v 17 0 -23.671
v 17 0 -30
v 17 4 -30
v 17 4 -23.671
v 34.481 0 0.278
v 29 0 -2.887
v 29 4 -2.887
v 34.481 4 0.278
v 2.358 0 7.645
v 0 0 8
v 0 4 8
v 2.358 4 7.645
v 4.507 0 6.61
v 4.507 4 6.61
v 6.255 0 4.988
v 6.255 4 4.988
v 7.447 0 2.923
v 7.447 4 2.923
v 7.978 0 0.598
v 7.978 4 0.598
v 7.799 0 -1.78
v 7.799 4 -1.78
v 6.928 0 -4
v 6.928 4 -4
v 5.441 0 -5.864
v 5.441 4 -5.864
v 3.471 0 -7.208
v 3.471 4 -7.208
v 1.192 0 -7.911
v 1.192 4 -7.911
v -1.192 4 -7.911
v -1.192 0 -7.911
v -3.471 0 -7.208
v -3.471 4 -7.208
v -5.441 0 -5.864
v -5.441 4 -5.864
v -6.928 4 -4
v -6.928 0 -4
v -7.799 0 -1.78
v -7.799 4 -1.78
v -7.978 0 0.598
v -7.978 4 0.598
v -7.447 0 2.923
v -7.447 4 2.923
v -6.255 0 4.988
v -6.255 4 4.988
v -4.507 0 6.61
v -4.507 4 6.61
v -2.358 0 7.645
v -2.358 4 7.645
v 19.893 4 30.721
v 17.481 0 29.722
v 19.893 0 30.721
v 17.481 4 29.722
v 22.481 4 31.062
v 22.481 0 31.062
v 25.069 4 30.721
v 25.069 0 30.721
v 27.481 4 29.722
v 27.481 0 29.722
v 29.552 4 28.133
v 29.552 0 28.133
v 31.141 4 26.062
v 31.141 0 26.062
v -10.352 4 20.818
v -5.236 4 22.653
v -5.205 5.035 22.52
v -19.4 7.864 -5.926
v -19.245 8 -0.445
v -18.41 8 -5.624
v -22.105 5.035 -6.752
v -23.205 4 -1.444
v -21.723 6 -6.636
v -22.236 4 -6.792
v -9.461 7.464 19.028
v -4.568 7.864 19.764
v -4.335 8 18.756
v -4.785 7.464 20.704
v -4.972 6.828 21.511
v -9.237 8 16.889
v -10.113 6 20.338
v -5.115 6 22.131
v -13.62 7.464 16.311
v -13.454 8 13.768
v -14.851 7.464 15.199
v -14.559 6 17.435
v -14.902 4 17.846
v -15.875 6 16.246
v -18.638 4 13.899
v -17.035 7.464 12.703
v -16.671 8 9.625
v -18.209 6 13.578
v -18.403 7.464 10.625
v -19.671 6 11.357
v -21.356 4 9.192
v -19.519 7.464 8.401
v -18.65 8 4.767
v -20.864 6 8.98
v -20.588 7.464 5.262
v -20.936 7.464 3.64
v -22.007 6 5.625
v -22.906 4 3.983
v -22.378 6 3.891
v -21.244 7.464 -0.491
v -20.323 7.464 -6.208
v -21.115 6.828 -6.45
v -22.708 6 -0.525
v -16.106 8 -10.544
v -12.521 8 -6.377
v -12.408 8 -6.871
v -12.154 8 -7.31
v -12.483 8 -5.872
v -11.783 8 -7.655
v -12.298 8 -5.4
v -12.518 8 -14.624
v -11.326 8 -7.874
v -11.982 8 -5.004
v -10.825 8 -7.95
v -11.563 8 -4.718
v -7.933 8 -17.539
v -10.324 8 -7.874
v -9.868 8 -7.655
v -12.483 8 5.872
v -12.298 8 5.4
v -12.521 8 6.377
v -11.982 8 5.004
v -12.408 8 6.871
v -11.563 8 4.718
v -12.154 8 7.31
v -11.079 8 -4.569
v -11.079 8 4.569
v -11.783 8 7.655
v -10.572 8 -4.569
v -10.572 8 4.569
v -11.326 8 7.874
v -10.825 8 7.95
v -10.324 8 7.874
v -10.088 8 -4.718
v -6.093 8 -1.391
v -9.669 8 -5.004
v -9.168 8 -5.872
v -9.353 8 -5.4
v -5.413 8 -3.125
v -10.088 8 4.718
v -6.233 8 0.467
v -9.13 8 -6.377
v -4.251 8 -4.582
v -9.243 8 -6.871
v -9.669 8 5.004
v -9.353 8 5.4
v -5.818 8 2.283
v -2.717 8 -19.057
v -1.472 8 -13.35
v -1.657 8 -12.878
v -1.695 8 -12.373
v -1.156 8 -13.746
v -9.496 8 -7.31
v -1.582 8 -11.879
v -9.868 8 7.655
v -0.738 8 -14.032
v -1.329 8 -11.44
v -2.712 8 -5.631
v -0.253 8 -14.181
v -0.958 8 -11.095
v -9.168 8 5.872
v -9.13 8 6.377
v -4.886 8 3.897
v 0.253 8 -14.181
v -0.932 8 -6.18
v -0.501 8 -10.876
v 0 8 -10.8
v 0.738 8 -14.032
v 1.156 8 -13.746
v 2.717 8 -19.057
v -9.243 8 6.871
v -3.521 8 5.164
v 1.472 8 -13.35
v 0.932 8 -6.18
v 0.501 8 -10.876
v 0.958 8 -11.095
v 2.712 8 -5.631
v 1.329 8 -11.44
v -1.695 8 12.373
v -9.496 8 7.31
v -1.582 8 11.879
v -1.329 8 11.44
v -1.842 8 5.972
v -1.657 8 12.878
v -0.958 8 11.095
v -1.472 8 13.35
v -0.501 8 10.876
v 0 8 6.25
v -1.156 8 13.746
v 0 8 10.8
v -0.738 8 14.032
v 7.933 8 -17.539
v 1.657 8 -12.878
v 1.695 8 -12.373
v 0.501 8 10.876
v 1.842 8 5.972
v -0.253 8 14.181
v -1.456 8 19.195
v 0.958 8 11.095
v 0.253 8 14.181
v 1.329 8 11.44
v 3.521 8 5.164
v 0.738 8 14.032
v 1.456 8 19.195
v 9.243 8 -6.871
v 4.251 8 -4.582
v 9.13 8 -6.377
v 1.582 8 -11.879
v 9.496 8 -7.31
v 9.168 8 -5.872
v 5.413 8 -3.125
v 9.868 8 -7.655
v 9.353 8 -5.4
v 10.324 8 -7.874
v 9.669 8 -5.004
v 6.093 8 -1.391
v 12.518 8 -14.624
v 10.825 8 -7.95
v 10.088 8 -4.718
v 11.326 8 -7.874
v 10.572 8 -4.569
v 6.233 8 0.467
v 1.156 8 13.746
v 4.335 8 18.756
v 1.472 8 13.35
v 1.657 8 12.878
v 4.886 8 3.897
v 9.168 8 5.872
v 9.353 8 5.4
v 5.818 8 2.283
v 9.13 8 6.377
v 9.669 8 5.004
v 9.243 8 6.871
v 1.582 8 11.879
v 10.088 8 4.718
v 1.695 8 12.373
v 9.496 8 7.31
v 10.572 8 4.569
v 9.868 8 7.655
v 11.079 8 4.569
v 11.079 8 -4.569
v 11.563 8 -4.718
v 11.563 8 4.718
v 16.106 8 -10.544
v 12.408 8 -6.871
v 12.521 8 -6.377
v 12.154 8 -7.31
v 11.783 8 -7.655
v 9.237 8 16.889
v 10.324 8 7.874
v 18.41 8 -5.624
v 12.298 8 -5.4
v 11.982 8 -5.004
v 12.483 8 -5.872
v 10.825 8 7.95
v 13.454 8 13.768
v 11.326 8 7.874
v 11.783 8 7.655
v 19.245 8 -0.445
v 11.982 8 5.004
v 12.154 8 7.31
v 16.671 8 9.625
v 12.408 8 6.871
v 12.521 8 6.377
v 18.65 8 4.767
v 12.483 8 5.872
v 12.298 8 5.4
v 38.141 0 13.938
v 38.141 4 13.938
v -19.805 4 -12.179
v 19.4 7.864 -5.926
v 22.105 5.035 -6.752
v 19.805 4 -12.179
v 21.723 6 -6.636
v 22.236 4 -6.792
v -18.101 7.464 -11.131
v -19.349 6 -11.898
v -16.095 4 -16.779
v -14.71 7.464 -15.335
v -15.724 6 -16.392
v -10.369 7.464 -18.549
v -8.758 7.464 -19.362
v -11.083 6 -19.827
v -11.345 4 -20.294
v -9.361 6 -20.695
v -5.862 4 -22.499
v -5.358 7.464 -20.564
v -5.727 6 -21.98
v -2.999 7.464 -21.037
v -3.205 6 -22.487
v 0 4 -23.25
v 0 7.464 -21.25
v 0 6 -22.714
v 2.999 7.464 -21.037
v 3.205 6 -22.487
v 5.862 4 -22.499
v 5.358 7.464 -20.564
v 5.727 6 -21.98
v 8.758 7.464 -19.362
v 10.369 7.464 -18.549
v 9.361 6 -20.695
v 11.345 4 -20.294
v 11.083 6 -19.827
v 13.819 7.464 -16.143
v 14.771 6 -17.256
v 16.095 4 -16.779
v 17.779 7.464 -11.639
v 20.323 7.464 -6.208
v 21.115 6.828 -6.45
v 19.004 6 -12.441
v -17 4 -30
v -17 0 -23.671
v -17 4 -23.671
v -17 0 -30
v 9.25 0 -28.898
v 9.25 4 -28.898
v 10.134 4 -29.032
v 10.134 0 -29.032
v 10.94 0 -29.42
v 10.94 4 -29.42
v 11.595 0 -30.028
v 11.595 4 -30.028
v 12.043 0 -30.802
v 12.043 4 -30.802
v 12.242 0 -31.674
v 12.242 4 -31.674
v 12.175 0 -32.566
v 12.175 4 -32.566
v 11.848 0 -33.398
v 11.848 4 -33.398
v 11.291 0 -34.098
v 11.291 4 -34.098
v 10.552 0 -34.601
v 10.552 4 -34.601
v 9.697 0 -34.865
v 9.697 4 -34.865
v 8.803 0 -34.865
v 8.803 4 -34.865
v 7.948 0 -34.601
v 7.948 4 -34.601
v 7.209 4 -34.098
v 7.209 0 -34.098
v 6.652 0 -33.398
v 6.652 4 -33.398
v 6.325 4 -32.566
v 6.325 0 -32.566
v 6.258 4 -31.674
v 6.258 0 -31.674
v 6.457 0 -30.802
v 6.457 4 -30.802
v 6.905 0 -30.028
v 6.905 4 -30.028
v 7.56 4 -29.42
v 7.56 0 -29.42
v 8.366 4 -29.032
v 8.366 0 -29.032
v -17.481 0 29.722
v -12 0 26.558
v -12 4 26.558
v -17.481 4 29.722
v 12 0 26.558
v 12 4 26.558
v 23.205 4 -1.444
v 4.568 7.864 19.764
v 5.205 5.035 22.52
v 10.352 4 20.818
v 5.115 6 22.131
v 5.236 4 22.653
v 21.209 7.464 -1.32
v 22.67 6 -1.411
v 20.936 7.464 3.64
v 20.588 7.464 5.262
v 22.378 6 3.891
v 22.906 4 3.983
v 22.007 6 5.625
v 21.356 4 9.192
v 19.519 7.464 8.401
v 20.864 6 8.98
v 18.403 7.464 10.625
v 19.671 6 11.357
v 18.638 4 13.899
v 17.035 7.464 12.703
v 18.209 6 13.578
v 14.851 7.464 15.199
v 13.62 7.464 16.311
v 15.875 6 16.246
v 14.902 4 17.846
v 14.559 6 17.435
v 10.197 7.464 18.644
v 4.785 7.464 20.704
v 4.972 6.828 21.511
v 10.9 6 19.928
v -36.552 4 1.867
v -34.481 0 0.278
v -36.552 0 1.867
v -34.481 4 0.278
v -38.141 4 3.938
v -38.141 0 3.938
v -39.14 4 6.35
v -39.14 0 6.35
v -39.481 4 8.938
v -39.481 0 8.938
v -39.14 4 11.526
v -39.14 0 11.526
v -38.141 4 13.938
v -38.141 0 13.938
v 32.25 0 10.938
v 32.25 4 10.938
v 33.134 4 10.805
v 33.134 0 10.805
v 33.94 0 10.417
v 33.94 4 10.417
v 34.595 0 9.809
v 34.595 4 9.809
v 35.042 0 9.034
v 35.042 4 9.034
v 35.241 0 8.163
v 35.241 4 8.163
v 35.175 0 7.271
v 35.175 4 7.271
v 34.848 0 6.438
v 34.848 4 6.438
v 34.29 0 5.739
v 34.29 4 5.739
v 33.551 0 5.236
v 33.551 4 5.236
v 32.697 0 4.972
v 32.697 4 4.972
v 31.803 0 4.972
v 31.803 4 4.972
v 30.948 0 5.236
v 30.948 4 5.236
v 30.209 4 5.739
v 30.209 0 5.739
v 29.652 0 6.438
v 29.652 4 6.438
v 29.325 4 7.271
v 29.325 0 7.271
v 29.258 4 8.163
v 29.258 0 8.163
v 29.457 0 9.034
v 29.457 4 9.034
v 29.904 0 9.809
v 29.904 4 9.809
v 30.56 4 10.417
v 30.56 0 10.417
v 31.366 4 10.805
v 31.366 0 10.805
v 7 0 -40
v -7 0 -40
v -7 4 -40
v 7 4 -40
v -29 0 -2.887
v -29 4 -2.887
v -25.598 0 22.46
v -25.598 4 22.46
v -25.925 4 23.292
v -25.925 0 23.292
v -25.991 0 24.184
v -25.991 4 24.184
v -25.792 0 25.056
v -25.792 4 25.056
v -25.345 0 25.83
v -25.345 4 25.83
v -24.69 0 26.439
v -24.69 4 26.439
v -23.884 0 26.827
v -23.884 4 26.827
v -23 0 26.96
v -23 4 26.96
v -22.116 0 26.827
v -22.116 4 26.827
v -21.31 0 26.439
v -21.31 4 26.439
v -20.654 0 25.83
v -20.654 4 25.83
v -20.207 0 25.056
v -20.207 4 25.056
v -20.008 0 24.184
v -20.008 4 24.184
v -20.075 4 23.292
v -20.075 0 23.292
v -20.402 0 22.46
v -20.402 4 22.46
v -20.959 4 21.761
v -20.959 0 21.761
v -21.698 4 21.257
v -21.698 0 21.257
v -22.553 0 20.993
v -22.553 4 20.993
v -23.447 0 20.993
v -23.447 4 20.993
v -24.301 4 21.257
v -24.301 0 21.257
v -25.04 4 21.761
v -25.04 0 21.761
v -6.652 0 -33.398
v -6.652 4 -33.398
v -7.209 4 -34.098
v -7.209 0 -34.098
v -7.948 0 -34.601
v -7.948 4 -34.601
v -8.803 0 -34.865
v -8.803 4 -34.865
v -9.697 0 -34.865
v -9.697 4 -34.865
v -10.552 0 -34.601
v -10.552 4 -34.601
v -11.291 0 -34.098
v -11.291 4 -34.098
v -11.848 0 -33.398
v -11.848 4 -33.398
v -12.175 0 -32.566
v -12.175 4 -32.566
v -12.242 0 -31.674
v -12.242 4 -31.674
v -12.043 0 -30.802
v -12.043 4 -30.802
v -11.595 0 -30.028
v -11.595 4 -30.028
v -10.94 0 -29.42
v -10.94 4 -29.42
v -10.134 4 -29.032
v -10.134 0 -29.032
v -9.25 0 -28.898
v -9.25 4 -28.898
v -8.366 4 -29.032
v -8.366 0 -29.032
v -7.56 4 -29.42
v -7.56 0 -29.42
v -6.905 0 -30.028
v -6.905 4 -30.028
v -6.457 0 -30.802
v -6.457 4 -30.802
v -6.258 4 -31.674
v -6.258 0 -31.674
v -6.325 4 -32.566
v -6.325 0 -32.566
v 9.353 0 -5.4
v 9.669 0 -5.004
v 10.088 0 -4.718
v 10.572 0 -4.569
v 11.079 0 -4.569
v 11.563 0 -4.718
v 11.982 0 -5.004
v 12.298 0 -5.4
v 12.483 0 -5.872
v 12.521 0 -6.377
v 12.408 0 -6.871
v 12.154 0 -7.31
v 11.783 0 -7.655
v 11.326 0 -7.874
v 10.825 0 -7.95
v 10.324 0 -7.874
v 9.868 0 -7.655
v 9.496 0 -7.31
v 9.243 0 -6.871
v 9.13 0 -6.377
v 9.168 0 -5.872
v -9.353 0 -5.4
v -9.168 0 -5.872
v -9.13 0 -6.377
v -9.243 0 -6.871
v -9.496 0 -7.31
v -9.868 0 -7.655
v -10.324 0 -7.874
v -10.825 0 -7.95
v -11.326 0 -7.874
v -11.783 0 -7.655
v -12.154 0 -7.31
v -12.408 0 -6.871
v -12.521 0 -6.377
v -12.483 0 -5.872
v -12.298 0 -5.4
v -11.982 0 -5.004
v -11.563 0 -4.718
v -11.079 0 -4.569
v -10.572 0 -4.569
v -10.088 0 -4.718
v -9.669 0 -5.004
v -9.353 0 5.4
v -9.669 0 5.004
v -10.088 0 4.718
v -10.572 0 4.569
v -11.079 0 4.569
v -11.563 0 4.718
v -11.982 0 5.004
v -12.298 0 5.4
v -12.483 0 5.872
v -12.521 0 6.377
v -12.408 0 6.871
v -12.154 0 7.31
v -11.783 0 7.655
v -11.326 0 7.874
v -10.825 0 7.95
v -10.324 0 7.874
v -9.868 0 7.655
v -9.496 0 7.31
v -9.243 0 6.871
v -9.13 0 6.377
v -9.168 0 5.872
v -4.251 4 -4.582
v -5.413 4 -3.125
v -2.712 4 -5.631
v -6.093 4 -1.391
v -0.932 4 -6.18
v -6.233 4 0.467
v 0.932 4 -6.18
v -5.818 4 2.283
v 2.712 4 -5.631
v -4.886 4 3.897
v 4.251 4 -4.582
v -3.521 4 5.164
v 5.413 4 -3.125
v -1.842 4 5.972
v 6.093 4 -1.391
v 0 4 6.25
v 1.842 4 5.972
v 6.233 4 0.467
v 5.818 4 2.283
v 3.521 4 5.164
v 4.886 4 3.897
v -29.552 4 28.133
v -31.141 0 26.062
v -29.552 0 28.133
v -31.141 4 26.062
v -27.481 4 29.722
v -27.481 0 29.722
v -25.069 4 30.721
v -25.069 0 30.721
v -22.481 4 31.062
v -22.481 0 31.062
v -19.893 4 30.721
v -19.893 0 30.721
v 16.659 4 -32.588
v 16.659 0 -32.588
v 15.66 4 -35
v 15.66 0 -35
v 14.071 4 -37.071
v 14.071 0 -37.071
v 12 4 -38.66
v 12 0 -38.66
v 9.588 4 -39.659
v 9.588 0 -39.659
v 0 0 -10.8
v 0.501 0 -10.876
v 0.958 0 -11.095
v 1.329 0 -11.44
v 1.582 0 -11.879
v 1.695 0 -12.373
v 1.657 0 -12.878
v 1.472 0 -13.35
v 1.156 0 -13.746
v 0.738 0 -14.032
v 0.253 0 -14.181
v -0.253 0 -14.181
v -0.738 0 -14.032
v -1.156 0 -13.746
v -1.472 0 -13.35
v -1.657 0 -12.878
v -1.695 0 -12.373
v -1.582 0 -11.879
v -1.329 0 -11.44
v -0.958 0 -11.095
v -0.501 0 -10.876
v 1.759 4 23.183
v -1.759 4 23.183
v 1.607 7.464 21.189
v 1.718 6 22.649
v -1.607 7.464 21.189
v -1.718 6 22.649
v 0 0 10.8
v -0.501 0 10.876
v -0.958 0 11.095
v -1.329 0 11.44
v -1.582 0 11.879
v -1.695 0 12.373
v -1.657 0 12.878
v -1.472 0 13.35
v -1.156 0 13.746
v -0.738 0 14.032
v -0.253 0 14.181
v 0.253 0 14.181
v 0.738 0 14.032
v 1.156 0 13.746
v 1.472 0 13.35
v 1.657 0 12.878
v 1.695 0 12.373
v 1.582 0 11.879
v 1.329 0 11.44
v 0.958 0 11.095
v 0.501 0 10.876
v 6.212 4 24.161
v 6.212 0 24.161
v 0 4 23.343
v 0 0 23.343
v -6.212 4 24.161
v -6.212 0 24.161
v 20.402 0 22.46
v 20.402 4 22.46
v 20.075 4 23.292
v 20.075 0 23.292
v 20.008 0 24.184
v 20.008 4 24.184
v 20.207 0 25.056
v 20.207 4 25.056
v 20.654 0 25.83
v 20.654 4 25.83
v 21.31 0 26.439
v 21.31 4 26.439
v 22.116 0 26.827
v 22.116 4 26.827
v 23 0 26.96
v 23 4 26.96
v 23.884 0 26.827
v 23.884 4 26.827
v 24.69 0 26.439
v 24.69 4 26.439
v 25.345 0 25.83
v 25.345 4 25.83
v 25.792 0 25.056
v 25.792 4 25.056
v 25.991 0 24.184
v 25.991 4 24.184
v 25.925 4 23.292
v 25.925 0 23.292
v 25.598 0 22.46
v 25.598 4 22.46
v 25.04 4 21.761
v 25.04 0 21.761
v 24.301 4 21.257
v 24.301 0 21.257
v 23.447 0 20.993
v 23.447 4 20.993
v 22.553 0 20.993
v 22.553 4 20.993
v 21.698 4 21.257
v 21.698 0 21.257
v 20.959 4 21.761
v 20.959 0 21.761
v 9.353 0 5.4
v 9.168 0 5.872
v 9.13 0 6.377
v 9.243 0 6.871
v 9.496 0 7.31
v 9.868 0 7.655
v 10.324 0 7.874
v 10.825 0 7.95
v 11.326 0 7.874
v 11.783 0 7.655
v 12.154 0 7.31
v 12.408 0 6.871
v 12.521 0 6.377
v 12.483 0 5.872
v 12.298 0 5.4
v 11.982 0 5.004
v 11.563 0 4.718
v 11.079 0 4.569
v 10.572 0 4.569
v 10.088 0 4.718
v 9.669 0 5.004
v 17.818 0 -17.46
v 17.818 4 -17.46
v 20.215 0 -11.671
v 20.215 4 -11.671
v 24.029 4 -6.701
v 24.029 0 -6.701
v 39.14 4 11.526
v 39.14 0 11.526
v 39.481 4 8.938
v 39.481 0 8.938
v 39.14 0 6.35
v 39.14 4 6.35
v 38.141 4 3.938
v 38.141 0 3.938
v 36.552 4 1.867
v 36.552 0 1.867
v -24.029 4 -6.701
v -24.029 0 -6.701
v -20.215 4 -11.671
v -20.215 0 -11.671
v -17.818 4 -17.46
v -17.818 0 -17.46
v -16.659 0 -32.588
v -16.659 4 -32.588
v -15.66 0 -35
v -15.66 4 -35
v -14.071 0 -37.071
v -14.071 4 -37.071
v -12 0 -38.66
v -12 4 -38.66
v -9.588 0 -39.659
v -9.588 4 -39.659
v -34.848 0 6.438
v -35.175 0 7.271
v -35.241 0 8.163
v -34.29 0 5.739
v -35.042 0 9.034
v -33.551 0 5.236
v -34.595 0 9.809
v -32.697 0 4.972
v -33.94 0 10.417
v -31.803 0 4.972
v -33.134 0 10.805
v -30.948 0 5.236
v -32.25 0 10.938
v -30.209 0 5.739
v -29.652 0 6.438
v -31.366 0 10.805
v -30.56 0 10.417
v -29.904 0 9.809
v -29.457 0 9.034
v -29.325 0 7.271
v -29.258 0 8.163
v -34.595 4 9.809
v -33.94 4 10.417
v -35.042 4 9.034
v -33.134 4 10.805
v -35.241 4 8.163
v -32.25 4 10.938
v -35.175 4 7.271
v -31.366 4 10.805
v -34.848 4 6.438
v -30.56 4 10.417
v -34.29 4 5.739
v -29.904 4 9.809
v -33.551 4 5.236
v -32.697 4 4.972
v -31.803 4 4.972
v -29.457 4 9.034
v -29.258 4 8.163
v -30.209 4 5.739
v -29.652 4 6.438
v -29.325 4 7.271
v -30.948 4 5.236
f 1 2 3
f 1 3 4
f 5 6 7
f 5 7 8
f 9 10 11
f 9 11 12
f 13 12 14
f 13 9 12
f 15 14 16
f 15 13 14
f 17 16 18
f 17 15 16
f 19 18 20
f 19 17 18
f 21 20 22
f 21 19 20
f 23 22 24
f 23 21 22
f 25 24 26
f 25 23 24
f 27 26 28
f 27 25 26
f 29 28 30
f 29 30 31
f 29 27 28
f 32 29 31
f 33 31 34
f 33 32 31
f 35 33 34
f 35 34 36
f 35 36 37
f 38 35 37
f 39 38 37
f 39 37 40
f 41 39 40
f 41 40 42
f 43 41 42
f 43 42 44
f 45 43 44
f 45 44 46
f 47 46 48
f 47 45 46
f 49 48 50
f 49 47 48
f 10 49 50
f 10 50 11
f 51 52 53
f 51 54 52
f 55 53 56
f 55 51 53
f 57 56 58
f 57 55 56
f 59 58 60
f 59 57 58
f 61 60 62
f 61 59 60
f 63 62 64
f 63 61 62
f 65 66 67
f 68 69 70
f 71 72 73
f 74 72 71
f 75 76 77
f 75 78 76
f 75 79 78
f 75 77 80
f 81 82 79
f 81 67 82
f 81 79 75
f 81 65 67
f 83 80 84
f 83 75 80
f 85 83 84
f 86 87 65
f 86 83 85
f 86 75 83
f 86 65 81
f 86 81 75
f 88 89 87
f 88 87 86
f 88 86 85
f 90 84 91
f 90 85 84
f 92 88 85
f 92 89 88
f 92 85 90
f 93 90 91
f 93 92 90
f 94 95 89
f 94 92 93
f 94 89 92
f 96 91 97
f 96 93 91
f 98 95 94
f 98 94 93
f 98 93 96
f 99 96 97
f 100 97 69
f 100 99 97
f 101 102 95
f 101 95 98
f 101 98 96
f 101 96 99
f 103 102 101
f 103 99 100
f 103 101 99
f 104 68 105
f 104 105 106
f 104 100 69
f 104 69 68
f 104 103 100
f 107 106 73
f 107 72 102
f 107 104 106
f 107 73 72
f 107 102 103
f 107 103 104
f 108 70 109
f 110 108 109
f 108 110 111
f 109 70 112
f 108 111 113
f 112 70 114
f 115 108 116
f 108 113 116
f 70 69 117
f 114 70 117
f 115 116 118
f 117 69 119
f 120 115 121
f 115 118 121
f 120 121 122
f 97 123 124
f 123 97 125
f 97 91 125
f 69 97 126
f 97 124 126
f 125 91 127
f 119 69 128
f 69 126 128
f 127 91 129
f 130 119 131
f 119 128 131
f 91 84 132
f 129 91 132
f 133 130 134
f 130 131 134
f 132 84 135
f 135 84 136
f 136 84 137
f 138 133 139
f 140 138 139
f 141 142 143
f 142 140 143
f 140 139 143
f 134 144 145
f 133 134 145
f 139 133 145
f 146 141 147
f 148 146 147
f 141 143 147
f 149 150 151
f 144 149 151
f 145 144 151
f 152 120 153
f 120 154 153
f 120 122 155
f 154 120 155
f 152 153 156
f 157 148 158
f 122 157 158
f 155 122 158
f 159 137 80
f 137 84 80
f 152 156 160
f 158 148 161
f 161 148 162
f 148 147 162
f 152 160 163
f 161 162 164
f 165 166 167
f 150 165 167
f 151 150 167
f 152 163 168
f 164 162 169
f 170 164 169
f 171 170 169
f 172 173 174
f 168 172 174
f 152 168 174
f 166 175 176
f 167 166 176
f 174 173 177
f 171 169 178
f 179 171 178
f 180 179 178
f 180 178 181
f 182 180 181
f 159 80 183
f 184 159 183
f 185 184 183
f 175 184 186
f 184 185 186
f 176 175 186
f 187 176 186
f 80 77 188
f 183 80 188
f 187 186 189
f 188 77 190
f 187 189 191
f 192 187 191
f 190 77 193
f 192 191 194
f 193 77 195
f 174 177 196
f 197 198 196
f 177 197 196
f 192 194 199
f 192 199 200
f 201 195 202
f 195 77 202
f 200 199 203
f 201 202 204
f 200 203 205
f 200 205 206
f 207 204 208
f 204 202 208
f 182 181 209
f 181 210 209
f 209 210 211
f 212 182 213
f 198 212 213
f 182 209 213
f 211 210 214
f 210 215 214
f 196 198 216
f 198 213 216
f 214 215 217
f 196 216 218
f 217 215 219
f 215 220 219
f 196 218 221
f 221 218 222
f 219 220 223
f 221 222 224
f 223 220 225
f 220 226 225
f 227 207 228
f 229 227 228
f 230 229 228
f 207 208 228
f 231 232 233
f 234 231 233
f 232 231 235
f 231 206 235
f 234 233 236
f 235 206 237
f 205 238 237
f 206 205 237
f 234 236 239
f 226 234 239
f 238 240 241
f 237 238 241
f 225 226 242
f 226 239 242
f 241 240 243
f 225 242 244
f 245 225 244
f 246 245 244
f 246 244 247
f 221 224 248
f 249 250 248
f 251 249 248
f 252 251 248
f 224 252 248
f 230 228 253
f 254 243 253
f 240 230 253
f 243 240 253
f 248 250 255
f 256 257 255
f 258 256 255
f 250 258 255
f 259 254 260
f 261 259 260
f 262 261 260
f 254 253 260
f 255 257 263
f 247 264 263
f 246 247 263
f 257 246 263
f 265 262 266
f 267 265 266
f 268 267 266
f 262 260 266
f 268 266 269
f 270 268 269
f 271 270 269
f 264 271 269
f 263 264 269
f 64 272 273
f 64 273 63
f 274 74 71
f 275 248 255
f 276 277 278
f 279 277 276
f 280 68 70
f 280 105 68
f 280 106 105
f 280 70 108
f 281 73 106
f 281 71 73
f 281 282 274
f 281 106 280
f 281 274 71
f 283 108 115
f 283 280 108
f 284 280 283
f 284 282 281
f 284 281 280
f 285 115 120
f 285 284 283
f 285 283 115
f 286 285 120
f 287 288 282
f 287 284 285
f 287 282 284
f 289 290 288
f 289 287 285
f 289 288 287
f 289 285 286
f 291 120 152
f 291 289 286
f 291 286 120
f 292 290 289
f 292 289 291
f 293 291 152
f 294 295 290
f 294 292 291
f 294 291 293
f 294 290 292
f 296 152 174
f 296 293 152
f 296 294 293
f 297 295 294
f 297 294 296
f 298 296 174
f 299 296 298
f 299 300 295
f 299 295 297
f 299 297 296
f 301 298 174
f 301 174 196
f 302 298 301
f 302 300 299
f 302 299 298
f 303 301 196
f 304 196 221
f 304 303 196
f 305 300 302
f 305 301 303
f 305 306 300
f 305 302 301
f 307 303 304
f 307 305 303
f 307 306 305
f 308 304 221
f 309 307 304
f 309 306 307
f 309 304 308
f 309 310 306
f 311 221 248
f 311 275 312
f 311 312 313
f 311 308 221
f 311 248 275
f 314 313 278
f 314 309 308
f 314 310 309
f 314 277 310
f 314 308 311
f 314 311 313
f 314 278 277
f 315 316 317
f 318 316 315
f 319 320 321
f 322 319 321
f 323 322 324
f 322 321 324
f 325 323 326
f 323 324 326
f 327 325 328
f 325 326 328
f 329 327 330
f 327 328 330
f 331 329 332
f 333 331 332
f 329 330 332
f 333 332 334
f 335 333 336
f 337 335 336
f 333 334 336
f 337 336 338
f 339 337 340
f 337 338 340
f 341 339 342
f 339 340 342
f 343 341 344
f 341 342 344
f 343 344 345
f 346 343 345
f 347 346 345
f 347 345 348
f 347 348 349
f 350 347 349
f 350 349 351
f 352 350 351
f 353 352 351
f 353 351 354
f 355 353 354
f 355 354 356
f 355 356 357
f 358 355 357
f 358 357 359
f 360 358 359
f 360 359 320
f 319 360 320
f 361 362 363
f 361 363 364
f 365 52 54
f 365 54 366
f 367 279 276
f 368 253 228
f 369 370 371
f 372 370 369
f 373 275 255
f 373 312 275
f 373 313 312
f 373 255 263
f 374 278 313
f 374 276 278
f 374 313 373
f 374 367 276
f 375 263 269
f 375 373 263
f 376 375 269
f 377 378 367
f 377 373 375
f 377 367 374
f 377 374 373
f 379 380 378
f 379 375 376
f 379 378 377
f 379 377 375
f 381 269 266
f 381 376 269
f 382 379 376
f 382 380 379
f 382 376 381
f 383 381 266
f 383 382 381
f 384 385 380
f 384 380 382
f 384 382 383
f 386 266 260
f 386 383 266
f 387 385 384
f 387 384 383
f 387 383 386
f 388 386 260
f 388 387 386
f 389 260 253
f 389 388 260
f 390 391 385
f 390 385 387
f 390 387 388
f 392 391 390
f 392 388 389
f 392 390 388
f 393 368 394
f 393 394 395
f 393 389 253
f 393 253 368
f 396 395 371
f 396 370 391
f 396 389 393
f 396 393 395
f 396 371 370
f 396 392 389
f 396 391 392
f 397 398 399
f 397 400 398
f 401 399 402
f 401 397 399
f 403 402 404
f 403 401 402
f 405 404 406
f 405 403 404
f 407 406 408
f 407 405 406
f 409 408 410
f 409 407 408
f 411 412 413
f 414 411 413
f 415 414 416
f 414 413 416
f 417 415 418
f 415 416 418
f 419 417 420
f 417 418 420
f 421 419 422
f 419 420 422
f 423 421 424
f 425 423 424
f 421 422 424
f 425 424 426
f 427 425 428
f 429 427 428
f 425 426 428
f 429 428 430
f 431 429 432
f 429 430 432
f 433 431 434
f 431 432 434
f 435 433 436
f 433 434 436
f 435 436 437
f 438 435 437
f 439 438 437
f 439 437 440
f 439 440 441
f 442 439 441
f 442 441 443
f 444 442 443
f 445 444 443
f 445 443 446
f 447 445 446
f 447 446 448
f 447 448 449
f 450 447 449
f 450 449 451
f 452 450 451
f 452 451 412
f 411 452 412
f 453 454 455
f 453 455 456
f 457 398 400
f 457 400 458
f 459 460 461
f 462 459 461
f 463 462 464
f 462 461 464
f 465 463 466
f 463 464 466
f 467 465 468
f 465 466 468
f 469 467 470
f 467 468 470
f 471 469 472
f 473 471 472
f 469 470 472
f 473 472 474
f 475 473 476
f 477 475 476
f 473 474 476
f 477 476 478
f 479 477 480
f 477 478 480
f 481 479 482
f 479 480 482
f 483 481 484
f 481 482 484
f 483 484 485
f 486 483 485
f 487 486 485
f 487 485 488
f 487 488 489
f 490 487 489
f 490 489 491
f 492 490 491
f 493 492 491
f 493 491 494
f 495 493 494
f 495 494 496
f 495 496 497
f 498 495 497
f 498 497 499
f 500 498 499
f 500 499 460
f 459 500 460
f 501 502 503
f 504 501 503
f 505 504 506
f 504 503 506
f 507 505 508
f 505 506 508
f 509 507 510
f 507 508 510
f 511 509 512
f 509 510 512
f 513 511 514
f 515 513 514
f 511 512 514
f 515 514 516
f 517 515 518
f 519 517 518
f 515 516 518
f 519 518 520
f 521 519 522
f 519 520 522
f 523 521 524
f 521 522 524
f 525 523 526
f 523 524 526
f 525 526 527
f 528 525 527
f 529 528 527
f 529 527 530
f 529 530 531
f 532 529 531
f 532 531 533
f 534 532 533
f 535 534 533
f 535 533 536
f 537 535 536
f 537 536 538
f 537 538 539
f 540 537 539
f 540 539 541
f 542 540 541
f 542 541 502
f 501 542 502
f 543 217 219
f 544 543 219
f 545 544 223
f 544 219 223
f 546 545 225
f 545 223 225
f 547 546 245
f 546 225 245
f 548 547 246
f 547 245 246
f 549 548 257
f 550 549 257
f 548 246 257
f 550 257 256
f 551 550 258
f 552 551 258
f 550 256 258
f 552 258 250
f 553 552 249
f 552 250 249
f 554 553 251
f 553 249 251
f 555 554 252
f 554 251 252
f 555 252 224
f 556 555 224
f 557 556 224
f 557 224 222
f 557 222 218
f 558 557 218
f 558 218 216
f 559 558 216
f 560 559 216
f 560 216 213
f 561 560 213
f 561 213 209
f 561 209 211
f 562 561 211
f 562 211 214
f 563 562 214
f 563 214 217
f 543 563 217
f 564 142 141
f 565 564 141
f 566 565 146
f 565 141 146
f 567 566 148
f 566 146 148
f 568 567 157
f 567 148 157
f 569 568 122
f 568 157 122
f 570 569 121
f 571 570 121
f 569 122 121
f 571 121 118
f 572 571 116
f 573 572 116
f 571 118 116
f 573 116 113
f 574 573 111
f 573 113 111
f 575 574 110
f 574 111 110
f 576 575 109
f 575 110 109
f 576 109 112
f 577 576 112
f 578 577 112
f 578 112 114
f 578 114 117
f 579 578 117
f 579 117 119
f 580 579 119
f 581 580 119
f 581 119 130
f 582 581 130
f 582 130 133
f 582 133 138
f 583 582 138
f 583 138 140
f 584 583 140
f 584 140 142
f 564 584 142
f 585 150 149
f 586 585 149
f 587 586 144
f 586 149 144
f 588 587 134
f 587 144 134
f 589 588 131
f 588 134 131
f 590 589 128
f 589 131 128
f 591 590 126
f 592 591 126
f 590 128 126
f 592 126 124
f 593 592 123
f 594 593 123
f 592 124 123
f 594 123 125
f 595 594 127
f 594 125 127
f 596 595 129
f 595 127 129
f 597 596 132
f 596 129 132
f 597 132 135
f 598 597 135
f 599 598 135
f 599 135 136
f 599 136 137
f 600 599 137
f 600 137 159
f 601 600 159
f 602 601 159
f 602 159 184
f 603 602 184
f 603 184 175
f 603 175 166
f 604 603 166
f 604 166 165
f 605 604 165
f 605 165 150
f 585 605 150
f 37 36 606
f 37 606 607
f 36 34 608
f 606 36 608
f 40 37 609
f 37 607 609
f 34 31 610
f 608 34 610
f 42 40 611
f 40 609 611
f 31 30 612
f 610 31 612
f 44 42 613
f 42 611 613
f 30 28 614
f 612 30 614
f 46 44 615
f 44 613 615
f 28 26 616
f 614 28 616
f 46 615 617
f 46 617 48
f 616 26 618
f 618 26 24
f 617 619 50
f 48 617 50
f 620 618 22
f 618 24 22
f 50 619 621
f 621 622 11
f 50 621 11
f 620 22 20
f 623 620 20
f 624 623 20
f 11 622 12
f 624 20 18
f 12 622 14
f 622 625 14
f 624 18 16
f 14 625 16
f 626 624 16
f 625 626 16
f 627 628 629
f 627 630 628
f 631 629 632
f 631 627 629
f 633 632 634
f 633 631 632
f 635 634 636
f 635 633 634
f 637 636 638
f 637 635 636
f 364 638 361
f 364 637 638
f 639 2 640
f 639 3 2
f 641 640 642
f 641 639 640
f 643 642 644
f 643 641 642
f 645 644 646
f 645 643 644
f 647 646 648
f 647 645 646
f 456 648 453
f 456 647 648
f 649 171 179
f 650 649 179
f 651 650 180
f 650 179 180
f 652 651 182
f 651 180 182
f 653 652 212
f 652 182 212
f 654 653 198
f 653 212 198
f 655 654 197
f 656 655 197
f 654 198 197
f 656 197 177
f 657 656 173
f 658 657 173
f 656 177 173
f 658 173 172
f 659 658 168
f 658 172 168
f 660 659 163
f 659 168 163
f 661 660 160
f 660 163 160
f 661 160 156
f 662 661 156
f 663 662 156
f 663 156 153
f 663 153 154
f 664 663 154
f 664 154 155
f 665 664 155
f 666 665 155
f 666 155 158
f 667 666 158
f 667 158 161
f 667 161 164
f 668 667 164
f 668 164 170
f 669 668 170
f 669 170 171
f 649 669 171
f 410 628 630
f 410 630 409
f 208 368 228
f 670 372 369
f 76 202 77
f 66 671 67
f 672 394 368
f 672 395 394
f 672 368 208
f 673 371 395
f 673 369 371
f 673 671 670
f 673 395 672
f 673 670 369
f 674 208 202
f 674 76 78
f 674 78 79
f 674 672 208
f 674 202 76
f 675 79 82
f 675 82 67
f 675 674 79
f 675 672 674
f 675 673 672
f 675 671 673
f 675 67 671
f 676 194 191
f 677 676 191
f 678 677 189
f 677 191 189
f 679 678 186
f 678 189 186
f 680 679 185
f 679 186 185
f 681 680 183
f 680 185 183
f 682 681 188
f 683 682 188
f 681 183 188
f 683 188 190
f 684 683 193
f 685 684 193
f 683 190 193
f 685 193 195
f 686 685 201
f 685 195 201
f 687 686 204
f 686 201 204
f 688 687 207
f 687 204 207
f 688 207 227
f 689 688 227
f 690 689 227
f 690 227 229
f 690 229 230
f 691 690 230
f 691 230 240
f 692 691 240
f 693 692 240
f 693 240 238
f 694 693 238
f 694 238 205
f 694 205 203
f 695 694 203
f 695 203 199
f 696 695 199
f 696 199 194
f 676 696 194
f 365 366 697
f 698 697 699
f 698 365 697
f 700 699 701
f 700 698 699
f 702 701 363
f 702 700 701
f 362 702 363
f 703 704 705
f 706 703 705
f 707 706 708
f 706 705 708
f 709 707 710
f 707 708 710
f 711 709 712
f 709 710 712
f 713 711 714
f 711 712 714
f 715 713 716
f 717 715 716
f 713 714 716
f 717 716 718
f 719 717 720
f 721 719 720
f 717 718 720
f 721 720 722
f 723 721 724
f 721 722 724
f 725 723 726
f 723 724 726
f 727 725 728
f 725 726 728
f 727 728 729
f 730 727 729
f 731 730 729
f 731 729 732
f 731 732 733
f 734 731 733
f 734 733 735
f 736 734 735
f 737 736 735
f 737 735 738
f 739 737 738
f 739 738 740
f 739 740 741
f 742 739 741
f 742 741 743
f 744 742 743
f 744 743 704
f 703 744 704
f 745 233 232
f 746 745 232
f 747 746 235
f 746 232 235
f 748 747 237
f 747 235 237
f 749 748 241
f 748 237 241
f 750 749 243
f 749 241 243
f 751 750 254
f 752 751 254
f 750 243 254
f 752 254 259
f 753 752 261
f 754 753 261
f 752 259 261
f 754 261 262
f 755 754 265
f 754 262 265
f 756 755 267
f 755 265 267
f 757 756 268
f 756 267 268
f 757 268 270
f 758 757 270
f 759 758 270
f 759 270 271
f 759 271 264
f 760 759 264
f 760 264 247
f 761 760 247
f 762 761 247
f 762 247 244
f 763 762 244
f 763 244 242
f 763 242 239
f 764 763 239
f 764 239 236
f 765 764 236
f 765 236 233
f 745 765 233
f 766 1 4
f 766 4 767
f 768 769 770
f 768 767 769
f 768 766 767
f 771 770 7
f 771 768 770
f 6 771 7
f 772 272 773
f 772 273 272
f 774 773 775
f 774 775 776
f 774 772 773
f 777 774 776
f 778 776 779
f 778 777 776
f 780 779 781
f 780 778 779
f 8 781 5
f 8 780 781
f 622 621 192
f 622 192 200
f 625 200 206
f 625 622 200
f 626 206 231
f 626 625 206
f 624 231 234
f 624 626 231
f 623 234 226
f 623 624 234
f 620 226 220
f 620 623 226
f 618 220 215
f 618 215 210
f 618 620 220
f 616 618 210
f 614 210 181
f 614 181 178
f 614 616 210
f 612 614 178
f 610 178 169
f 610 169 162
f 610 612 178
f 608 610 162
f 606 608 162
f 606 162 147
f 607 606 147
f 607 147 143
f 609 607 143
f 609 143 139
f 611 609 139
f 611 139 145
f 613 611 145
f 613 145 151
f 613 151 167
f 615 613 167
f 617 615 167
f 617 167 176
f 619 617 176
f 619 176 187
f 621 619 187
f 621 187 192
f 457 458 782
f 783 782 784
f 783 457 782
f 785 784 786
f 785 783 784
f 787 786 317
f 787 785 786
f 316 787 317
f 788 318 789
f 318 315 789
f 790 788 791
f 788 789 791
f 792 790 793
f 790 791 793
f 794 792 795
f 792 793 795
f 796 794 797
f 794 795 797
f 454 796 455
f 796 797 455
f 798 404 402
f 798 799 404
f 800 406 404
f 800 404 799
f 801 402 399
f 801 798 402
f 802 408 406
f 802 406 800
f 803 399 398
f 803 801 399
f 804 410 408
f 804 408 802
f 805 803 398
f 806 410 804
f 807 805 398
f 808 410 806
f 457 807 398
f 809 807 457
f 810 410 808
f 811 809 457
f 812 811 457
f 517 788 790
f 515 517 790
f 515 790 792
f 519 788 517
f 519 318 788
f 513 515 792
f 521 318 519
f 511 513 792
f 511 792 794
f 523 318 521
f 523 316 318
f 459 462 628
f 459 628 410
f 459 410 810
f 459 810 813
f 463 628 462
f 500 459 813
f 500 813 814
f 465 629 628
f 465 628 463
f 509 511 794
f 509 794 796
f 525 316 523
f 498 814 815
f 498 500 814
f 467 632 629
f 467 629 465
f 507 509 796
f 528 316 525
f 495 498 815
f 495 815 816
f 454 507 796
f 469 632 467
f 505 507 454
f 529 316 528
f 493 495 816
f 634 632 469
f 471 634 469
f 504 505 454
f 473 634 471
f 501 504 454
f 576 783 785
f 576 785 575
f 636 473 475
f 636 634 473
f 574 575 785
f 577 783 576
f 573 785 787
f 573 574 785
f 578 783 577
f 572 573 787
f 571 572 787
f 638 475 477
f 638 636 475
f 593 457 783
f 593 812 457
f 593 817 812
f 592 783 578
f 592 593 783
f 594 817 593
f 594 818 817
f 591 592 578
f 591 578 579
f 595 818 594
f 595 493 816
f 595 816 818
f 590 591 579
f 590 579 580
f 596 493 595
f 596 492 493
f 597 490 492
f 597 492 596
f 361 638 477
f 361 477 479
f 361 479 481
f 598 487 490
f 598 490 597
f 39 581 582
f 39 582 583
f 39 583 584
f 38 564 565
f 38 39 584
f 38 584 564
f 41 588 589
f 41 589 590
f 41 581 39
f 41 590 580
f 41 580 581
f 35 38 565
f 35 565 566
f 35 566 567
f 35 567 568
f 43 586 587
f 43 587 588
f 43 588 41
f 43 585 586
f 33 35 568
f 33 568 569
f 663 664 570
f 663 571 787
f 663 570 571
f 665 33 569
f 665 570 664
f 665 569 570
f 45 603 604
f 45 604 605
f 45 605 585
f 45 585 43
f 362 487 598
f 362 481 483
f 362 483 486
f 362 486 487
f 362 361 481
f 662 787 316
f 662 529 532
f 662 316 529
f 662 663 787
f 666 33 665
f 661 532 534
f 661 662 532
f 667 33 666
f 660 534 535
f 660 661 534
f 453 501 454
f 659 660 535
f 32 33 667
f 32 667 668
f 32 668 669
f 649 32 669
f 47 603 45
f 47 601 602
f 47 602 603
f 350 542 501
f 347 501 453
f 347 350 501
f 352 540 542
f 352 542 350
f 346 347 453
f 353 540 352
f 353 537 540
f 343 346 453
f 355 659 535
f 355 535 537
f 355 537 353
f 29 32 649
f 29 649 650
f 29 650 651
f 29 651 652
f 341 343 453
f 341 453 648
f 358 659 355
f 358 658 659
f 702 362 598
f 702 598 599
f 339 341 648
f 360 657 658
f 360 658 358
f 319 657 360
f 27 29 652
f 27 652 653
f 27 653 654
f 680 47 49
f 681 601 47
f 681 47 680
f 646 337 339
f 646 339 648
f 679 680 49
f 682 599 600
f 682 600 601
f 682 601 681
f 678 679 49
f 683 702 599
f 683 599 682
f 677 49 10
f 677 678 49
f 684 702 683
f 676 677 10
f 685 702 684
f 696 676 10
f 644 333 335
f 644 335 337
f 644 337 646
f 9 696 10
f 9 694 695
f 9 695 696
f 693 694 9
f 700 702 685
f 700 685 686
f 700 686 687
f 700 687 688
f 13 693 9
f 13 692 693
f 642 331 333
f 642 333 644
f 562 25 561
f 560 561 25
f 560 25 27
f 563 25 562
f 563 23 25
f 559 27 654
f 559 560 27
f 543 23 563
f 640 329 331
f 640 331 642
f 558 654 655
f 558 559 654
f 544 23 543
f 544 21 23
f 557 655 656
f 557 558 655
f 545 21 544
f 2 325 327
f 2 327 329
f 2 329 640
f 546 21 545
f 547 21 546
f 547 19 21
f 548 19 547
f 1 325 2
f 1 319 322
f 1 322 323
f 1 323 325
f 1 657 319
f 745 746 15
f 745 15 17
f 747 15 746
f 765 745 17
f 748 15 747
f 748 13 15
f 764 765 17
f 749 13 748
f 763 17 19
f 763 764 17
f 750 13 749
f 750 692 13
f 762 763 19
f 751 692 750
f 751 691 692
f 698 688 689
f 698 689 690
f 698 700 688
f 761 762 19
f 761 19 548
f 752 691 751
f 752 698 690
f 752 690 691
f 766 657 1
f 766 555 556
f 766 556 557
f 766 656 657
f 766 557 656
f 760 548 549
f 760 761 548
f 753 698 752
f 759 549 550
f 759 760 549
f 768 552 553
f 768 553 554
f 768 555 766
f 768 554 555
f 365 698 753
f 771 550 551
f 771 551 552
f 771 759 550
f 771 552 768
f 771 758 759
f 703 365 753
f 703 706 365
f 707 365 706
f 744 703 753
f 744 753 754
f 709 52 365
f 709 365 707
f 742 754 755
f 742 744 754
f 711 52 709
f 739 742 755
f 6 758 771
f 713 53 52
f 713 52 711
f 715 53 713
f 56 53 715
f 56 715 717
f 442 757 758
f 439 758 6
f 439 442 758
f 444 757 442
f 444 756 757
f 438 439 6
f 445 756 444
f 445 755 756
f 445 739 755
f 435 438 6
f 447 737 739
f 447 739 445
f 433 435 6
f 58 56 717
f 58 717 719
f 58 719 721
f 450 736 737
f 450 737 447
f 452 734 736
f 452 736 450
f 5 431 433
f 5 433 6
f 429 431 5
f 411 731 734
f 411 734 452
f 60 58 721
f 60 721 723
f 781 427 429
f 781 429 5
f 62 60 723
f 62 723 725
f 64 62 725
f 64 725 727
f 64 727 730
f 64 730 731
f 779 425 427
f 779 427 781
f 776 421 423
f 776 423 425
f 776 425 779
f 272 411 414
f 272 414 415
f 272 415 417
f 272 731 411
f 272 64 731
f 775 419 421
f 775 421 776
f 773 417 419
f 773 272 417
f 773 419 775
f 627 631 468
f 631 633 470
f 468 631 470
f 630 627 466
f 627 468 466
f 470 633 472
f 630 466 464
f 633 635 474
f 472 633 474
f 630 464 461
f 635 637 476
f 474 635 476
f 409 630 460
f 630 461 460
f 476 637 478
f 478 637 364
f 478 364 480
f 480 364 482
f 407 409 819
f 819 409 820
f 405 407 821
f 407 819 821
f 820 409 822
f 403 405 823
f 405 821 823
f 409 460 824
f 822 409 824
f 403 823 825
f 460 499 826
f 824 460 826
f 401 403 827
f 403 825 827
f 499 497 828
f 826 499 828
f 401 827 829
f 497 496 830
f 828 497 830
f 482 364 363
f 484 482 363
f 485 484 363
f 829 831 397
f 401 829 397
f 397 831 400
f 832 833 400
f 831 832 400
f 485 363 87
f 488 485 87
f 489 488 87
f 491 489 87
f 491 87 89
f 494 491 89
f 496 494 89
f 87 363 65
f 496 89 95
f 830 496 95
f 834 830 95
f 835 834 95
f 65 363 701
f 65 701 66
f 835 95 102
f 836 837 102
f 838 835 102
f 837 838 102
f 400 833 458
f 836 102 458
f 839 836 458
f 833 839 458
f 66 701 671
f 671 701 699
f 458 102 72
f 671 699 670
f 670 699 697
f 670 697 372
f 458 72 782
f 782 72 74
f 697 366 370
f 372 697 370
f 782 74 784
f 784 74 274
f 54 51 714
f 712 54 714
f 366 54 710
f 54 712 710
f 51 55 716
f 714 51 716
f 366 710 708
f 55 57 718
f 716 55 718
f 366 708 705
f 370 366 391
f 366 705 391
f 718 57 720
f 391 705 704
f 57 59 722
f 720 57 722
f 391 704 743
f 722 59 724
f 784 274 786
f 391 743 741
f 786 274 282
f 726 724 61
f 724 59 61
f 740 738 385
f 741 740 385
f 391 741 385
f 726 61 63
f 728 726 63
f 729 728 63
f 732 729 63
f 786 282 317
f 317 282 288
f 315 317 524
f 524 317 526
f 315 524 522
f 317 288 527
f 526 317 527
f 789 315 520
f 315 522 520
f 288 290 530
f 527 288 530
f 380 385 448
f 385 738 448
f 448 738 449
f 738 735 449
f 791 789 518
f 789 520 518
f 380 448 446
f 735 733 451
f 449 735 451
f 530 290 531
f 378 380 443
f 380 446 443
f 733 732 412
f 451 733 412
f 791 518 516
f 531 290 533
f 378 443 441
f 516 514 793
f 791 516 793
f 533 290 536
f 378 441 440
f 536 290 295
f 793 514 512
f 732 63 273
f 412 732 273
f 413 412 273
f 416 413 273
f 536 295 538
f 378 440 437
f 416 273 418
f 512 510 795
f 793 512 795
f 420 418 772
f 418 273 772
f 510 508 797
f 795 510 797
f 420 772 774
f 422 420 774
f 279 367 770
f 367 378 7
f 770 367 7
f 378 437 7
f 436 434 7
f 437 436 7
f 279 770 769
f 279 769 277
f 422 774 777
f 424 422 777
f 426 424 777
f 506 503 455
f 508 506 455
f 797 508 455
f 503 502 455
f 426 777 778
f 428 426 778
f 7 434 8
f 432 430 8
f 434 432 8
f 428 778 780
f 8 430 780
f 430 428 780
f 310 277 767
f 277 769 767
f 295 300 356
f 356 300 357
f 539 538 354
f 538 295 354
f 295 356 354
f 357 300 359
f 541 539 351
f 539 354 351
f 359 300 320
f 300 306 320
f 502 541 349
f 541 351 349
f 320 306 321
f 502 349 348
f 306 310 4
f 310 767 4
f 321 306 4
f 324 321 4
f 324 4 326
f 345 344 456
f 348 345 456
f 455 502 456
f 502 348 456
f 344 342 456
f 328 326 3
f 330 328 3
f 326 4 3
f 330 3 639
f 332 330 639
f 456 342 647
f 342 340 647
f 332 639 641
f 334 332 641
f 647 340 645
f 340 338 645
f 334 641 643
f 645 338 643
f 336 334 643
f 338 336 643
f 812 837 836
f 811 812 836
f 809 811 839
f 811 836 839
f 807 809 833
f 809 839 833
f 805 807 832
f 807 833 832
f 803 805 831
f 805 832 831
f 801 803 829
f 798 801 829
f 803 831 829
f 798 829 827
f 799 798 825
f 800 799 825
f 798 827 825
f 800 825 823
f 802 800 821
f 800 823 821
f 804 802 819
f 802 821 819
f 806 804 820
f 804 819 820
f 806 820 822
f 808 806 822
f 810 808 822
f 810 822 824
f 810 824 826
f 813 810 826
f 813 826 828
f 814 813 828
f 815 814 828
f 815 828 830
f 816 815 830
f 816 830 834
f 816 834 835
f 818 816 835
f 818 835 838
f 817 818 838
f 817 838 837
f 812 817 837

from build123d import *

# Parameters (mm, degrees)
SKETCH_1_R               = 6.25
EXTRUDE_627_DEPTH        = 8
SKETCH_2_R               = 8
CUT_EXTRUDE_911_DEPTH    = 4
SKETCH_3_R               = 1.7
CUT_EXTRUDE_3_DEPTH      = 60.372950698
PATTERN_CIRCULAR_1_COUNT = 6
SKETCH_4_R               = 47.5
SKETCH_4_R_2             = 23.25
CUT_EXTRUDE_3_2_DEPTH    = 4
FILLET_1_R               = 10
FILLET_2_R               = 24
FILLET_3_R               = 4
SKETCH_5_R               = 3
CUT_EXTRUDE_2981_DEPTH   = 57.344747555
PATTERN_CIRCULAR_2_COUNT = 3


# Some blends are built 0.0001 mm under size
with BuildPart() as part:
    # Эскиз1 → Extrude 627 (new body)
    with BuildSketch(Plane(origin=(0, 0, 0), x_dir=(1, 0, 0), z_dir=(0, 1, 0))):
        Polygon((-17, 9.814954576), (-17, 40), (17, 40), (17, 9.814954576), (43.141016151, -5.277568136), (26.141016151, -34.722431864), (0, -19.629909152), (-26.141016151, -34.722431864), (-43.141016151, -5.277568136), align=None)
        with Locations(Location((0, 0, 0), (0, 0, 270))):
            Circle(SKETCH_1_R, mode=Mode.SUBTRACT)
    extrude(amount=EXTRUDE_627_DEPTH)

    # Эскиз2 → Cut-Extrude 911 (cut)
    with BuildSketch(Plane(origin=(0, 0, 0), x_dir=(1, 0, 0), z_dir=(0, 1, 0))):
        with Locations(Location((0, 0, 0), (0, 0, 270))):
            Circle(SKETCH_2_R)
    extrude(amount=CUT_EXTRUDE_911_DEPTH, mode=Mode.SUBTRACT)

    # Эскиз3 → Cut-Extrude 3 (cut, through all)
    with BuildSketch(Plane(origin=(0, 8, 0), x_dir=(1, 0, 0), z_dir=(0, 1, 0))):
        with Locations(Location((0, 12.5, 0), (0, 0, 270))):
            Circle(SKETCH_3_R)
    cut_extrude_3 = extrude(amount=-CUT_EXTRUDE_3_DEPTH, mode=Mode.SUBTRACT)

    # Круговой массив1: Cut-Extrude 3 ×6 about axis
    pattern_circular_1_axis = Axis((0, 0, 0), (0, 1, 0))
    for i in range(1, PATTERN_CIRCULAR_1_COUNT):
        add(cut_extrude_3.rotate(pattern_circular_1_axis, i * 360 / PATTERN_CIRCULAR_1_COUNT), mode=Mode.SUBTRACT)

    # Эскиз4 → Cut-Extrude 3 2 (cut)
    with BuildSketch(Plane.XZ.offset(-8)):
        Circle(SKETCH_4_R)
        Circle(SKETCH_4_R_2, mode=Mode.SUBTRACT)
    extrude(amount=CUT_EXTRUDE_3_2_DEPTH, mode=Mode.SUBTRACT)

    # Скругление1
    fillet_1_edges = [part.edges().sort_by_distance(p)[0] for p in [
        (-17, 2, -40),
        (17, 2, -40),
        (43.141016151, 2, 5.277568136),
        (26.141016151, 2, 34.722431864),
        (-26.141016151, 2, 34.722431864),
        (-43.141016151, 2, 5.277568136),
    ]]
    fillet(fillet_1_edges, radius=FILLET_1_R)

    # Скругление2
    # the kernel refuses this fillet: 24 mm, written as the material it adds along each edge
    with BuildSketch(Plane(origin=(17, 0, -9.814954576), x_dir=(0, 0, -1), z_dir=(0, 1, 0))) as fillet_2_piece_1_section:
        with BuildLine():
            CenterArc((FILLET_2_R * 0.57735026919, -FILLET_2_R), FILLET_2_R, 90, 60)
            Line((-FILLET_2_R * 0.288675134595, -FILLET_2_R * 0.5), (0, 0))
            Line((0, 0), (FILLET_2_R * 0.57735026919, 0))
        make_face()
    fillet_2_piece_1 = extrude(amount=8, mode=Mode.PRIVATE)
    fillet_2_piece_1 = split(fillet_2_piece_1, bisect_by=Plane(origin=(20.179222724, 4, -11.650479672), z_dir=(0, -1, 0)), keep=Keep.TOP, mode=Mode.PRIVATE)
    fillet_2_piece_1 = fillet_2_piece_1 - Plane(origin=(0, 2, 0), x_dir=(1, 0, 0), z_dir=(0, 1, 0)) * Cylinder(23.25, 72, mode=Mode.PRIVATE)
    add(fillet_2_piece_1)
    with BuildSketch(Plane(origin=(17, 0, -9.814954576), x_dir=(0, 0, -1), z_dir=(0, 1, 0))) as fillet_2_piece_2_section:
        with BuildLine():
            CenterArc((FILLET_2_R * 0.57735026919, -FILLET_2_R), FILLET_2_R, 90, 60)
            Line((-FILLET_2_R * 0.288675134595, -FILLET_2_R * 0.5), (0, 0))
            Line((0, 0), (FILLET_2_R * 0.57735026919, 0))
        make_face()
    fillet_2_piece_2 = extrude(amount=8, mode=Mode.PRIVATE)
    fillet_2_piece_2 = split(fillet_2_piece_2, bisect_by=Plane(origin=(18.777250195, 4, -10.841050455), z_dir=(0, -1, 0)), keep=Keep.TOP, mode=Mode.PRIVATE)
    fillet_2_piece_2 = fillet_2_piece_2 & Plane(origin=(0, 2, 0), x_dir=(1, 0, 0), z_dir=(0, 1, 0)) * Cylinder(23.25, 72, mode=Mode.PRIVATE)
    add(fillet_2_piece_2)
    with BuildSketch(Plane(origin=(17, 0, -9.814954576), x_dir=(0, 0, -1), z_dir=(0, 1, 0))) as fillet_2_piece_3_section:
        with BuildLine():
            CenterArc((FILLET_2_R * 0.57735026919, -FILLET_2_R), FILLET_2_R, 90, 60)
            Line((-FILLET_2_R * 0.288675134595, -FILLET_2_R * 0.5), (0, 0))
            Line((0, 0), (FILLET_2_R * 0.57735026919, 0))
        make_face()
    fillet_2_piece_3 = extrude(amount=8, mode=Mode.PRIVATE)
    fillet_2_piece_3 = split(fillet_2_piece_3, bisect_by=Plane(origin=(18.777250195, 4, -10.841050455), z_dir=(0, 1, 0)), keep=Keep.TOP, mode=Mode.PRIVATE)
    fillet_2_piece_3 = fillet_2_piece_3 & Plane(origin=(0, 6, 0), x_dir=(1, 0, 0), z_dir=(0, 1, 0)) * Cylinder(23.25, 72, mode=Mode.PRIVATE)
    add(fillet_2_piece_3)
    with BuildSketch(Plane(origin=(-17, 0, -9.814954576), x_dir=(0, 0, -1), z_dir=(0, 1, 0))) as fillet_2_piece_4_section:
        with BuildLine():
            CenterArc((FILLET_2_R * 0.57735026919, FILLET_2_R), FILLET_2_R, 210, 60)
            Line((-FILLET_2_R * 0.288675134595, FILLET_2_R * 0.5), (0, 0))
            Line((0, 0), (FILLET_2_R * 0.57735026919, 0))
        make_face()
    fillet_2_piece_4 = extrude(amount=8, mode=Mode.PRIVATE)
    fillet_2_piece_4 = split(fillet_2_piece_4, bisect_by=Plane(origin=(-20.179222724, 4, -11.650479672), z_dir=(0, -1, 0)), keep=Keep.TOP, mode=Mode.PRIVATE)
    fillet_2_piece_4 = fillet_2_piece_4 - Plane(origin=(0, 2, 0), x_dir=(1, 0, 0), z_dir=(0, 1, 0)) * Cylinder(23.25, 72, mode=Mode.PRIVATE)
    add(fillet_2_piece_4)
    with BuildSketch(Plane(origin=(-17, 0, -9.814954576), x_dir=(0, 0, -1), z_dir=(0, 1, 0))) as fillet_2_piece_5_section:
        with BuildLine():
            CenterArc((FILLET_2_R * 0.57735026919, FILLET_2_R), FILLET_2_R, 210, 60)
            Line((-FILLET_2_R * 0.288675134595, FILLET_2_R * 0.5), (0, 0))
            Line((0, 0), (FILLET_2_R * 0.57735026919, 0))
        make_face()
    fillet_2_piece_5 = extrude(amount=8, mode=Mode.PRIVATE)
    fillet_2_piece_5 = split(fillet_2_piece_5, bisect_by=Plane(origin=(-18.777250195, 4, -10.841050455), z_dir=(0, -1, 0)), keep=Keep.TOP, mode=Mode.PRIVATE)
    fillet_2_piece_5 = fillet_2_piece_5 & Plane(origin=(0, 2, 0), x_dir=(1, 0, 0), z_dir=(0, 1, 0)) * Cylinder(23.25, 72, mode=Mode.PRIVATE)
    add(fillet_2_piece_5)
    with BuildSketch(Plane(origin=(-17, 0, -9.814954576), x_dir=(0, 0, -1), z_dir=(0, 1, 0))) as fillet_2_piece_6_section:
        with BuildLine():
            CenterArc((FILLET_2_R * 0.57735026919, FILLET_2_R), FILLET_2_R, 210, 60)
            Line((-FILLET_2_R * 0.288675134595, FILLET_2_R * 0.5), (0, 0))
            Line((0, 0), (FILLET_2_R * 0.57735026919, 0))
        make_face()
    fillet_2_piece_6 = extrude(amount=8, mode=Mode.PRIVATE)
    fillet_2_piece_6 = split(fillet_2_piece_6, bisect_by=Plane(origin=(-18.777250195, 4, -10.841050455), z_dir=(0, 1, 0)), keep=Keep.TOP, mode=Mode.PRIVATE)
    fillet_2_piece_6 = fillet_2_piece_6 & Plane(origin=(0, 6, 0), x_dir=(1, 0, 0), z_dir=(0, 1, 0)) * Cylinder(23.25, 72, mode=Mode.PRIVATE)
    add(fillet_2_piece_6)
    with BuildSketch(Plane(origin=(0, 0, 19.629909152), x_dir=(-0.8660254037844384, 0, 0.5000000000000003), z_dir=(0, 1, 0))) as fillet_2_piece_7_section:
        with BuildLine():
            CenterArc((FILLET_2_R * 0.57735026919, FILLET_2_R), FILLET_2_R, 210, 60)
            Line((-FILLET_2_R * 0.288675134595, FILLET_2_R * 0.5), (0, 0))
            Line((0, 0), (FILLET_2_R * 0.57735026919, 0))
        make_face()
    fillet_2_piece_7 = extrude(amount=8, mode=Mode.PRIVATE)
    fillet_2_piece_7 = split(fillet_2_piece_7, bisect_by=Plane(origin=(0, 4, 23.300959344), z_dir=(0, -1, 0)), keep=Keep.TOP, mode=Mode.PRIVATE)
    fillet_2_piece_7 = fillet_2_piece_7 - Plane(origin=(0, 2, 0), x_dir=(1, 0, 0), z_dir=(0, 1, 0)) * Cylinder(23.25, 72, mode=Mode.PRIVATE)
    add(fillet_2_piece_7)
    with BuildSketch(Plane(origin=(0, 0, 19.629909152), x_dir=(-0.8660254037844384, 0, 0.5000000000000003), z_dir=(0, 1, 0))) as fillet_2_piece_8_section:
        with BuildLine():
            CenterArc((FILLET_2_R * 0.57735026919, FILLET_2_R), FILLET_2_R, 210, 60)
            Line((-FILLET_2_R * 0.288675134595, FILLET_2_R * 0.5), (0, 0))
            Line((0, 0), (FILLET_2_R * 0.57735026919, 0))
        make_face()
    fillet_2_piece_8 = extrude(amount=8, mode=Mode.PRIVATE)
    fillet_2_piece_8 = split(fillet_2_piece_8, bisect_by=Plane(origin=(0, 4, 21.68210091), z_dir=(0, -1, 0)), keep=Keep.TOP, mode=Mode.PRIVATE)
    fillet_2_piece_8 = fillet_2_piece_8 & Plane(origin=(0, 2, 0), x_dir=(1, 0, 0), z_dir=(0, 1, 0)) * Cylinder(23.25, 72, mode=Mode.PRIVATE)
    add(fillet_2_piece_8)
    with BuildSketch(Plane(origin=(0, 0, 19.629909152), x_dir=(-0.8660254037844384, 0, 0.5000000000000003), z_dir=(0, 1, 0))) as fillet_2_piece_9_section:
        with BuildLine():
            CenterArc((FILLET_2_R * 0.57735026919, FILLET_2_R), FILLET_2_R, 210, 60)
            Line((-FILLET_2_R * 0.288675134595, FILLET_2_R * 0.5), (0, 0))
            Line((0, 0), (FILLET_2_R * 0.57735026919, 0))
        make_face()
    fillet_2_piece_9 = extrude(amount=8, mode=Mode.PRIVATE)
    fillet_2_piece_9 = split(fillet_2_piece_9, bisect_by=Plane(origin=(0, 4, 21.68210091), z_dir=(0, 1, 0)), keep=Keep.TOP, mode=Mode.PRIVATE)
    fillet_2_piece_9 = fillet_2_piece_9 & Plane(origin=(0, 6, 0), x_dir=(1, 0, 0), z_dir=(0, 1, 0)) * Cylinder(23.25, 72, mode=Mode.PRIVATE)
    add(fillet_2_piece_9)

    # Скругление3
    fillet_3_edges = [part.edges().sort_by_distance(p)[0] for p in [
        (-5.23578811, 8, -22.652792827),
    ]]
    fillet(fillet_3_edges, radius=FILLET_3_R - 0.0001)  # a hair under: the kernel refuses the full size

    # Эскиз5 → Cut-Extrude 2981 (cut, through all)
    with BuildSketch(Plane(origin=(0, 4, 0), x_dir=(-1, 0, 0), z_dir=(0, 1, 0))):
        with Locations(Location((-9.25, -31.898395826, 0), (0, 0, 90))):
            Circle(SKETCH_5_R)
        with Locations(Location((-32.249821125, 7.938462928, 0), (0, 0, 90))):
            Circle(SKETCH_5_R)
    cut_extrude_2981 = extrude(amount=-CUT_EXTRUDE_2981_DEPTH, mode=Mode.SUBTRACT)

    # Круговой массив2: Cut-Extrude 2981 ×3 about axis
    pattern_circular_2_axis = Axis((0, 0, 0), (0, 1, 0))
    for i in range(1, PATTERN_CIRCULAR_2_COUNT):
        add(cut_extrude_2981.rotate(pattern_circular_2_axis, i * 360 / PATTERN_CIRCULAR_2_COUNT), mode=Mode.SUBTRACT)


solid = part.part
